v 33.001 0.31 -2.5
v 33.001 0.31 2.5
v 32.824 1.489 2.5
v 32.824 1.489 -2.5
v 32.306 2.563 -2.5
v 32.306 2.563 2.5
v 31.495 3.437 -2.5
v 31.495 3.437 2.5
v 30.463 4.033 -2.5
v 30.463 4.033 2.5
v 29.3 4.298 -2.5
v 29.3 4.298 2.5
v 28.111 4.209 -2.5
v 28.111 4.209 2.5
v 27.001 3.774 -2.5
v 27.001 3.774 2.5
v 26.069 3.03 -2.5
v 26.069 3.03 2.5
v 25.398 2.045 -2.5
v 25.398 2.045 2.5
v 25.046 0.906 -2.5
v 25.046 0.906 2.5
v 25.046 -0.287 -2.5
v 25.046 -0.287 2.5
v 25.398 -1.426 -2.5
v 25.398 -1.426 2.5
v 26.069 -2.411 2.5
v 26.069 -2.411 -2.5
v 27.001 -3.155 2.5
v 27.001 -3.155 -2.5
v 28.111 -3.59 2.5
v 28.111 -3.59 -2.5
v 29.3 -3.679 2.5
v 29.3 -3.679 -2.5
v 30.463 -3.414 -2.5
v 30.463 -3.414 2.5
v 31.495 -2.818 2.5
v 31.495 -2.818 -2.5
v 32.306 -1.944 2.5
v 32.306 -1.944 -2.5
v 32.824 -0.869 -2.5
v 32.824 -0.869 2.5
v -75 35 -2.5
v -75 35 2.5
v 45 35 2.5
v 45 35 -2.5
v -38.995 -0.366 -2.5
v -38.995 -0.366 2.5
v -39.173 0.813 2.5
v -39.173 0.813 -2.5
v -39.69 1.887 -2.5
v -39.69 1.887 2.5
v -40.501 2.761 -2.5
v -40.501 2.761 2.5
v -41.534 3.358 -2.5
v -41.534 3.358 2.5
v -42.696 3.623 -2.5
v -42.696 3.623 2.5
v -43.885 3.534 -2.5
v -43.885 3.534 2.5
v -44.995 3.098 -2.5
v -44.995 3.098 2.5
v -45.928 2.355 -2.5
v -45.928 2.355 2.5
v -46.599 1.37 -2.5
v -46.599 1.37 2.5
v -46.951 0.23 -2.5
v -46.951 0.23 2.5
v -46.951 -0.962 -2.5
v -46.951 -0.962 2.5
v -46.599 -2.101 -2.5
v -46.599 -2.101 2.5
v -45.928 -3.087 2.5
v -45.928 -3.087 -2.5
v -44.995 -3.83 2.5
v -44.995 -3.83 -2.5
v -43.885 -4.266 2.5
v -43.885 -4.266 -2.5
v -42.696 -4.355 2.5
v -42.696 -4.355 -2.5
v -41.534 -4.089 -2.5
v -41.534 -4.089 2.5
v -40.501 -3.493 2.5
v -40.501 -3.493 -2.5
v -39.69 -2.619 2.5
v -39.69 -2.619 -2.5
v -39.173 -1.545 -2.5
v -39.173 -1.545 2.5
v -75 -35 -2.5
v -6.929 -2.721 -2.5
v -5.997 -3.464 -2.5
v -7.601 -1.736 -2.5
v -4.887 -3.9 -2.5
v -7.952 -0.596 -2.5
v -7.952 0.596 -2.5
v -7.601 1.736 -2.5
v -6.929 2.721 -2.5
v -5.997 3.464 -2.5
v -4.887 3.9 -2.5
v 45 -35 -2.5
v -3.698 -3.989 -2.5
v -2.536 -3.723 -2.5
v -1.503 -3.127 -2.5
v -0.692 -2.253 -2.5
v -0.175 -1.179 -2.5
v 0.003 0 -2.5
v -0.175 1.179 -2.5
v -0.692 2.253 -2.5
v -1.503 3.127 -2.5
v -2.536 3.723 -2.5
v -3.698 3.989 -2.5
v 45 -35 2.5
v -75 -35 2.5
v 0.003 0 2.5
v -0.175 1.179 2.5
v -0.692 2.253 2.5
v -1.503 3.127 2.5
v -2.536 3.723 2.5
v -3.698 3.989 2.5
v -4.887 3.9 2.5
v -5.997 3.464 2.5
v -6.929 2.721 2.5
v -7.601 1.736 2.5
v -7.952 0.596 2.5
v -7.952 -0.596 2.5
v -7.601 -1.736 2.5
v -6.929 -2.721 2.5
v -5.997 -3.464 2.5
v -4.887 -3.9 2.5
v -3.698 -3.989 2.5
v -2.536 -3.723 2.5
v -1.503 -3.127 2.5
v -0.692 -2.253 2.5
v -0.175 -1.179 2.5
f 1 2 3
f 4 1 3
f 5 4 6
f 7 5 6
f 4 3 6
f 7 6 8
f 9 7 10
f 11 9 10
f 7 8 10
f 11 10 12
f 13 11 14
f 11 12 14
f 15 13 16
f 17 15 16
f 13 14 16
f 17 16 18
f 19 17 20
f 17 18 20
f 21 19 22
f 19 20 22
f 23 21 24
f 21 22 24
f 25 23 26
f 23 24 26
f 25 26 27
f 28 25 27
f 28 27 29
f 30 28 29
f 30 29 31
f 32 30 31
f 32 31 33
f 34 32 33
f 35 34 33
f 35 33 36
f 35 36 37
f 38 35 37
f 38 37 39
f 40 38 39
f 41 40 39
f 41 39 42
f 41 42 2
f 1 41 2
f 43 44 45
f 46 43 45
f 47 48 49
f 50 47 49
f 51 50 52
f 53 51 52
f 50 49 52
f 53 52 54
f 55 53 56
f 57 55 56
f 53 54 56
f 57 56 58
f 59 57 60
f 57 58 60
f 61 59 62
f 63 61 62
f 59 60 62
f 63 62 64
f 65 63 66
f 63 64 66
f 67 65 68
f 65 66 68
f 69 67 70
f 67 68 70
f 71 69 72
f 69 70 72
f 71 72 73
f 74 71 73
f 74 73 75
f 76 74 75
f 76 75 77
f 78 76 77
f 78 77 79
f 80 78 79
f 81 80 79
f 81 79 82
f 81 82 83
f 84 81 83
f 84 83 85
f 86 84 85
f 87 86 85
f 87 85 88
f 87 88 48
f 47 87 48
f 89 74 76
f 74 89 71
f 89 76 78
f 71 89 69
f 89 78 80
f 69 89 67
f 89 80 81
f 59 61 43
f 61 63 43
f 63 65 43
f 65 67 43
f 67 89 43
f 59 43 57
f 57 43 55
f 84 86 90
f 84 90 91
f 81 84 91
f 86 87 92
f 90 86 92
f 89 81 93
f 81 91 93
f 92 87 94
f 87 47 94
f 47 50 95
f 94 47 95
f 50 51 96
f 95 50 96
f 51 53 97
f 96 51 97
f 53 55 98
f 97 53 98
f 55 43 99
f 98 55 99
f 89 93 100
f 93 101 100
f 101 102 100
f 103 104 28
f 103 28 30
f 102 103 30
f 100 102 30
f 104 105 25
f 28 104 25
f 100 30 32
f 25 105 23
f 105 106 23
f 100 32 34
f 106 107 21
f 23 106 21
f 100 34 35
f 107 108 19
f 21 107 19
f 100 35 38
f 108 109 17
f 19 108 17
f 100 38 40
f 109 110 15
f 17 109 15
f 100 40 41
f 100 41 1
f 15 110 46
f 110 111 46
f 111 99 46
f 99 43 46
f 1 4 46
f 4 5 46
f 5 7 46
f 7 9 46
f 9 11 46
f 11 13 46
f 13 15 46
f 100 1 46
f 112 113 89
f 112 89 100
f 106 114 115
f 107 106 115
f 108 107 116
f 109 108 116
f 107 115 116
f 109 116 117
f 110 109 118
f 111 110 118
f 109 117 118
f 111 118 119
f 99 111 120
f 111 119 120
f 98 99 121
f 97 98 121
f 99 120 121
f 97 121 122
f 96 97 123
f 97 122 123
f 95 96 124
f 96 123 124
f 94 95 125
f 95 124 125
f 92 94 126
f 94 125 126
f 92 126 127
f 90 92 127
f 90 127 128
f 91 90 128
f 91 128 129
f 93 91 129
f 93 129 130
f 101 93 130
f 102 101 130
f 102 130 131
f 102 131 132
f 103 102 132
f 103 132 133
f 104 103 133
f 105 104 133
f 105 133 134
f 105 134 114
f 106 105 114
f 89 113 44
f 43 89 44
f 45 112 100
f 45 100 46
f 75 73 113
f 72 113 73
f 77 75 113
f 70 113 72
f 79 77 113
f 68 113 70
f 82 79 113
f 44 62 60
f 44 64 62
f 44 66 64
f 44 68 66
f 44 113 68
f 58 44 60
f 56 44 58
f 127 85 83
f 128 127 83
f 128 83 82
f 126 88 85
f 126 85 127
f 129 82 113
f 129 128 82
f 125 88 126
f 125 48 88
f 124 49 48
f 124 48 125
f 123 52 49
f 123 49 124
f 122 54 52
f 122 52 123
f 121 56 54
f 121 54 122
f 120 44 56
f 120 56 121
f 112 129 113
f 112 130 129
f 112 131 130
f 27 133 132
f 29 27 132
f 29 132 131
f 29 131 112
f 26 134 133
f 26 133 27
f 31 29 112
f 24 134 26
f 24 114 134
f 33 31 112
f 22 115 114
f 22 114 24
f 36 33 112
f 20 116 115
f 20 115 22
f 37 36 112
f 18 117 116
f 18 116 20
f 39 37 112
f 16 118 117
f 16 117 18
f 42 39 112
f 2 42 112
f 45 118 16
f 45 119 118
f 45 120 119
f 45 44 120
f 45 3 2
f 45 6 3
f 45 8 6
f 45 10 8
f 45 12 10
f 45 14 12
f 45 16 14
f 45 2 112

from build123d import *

# Parameters (mm, degrees)
SKETCH1_W           = 150
SKETCH1_H           = 70
BOSS_EXTRUDE1_DEPTH = 2.5
SKETCH2_R           = 4
CUT_EXTRUDE1_DEPTH  = 6
SKETCH3_W           = 30
SKETCH3_H           = 70
CUT_EXTRUDE2_DEPTH  = 6


with BuildPart() as part:
    # Sketch1 → Boss-Extrude1 (new body, symmetric)
    with BuildSketch(Plane.XY):
        Rectangle(SKETCH1_W, SKETCH1_H)
    extrude(amount=BOSS_EXTRUDE1_DEPTH, both=True)

    # Sketch2 → Cut-Extrude1 (cut, through all)
    with BuildSketch(Plane.XY.offset(2.5)):
        with Locations((63, 0.628549325)):
            Circle(SKETCH2_R)
        with Locations((29.001496193, 0.309583996)):
            Circle(SKETCH2_R)
        with Locations((-42.995335398, -0.365871995)):
            Circle(SKETCH2_R)
        with Locations((-3.99705162, 0)):
            Circle(SKETCH2_R)
    extrude(amount=-CUT_EXTRUDE1_DEPTH, mode=Mode.SUBTRACT)

    # Sketch3 → Cut-Extrude2 (cut, through all)
    with BuildSketch(Plane.XY.offset(2.5)):
        with Locations((60, 0)):
            Rectangle(SKETCH3_W, SKETCH3_H)
    extrude(amount=-CUT_EXTRUDE2_DEPTH, mode=Mode.SUBTRACT)


solid = part.part
